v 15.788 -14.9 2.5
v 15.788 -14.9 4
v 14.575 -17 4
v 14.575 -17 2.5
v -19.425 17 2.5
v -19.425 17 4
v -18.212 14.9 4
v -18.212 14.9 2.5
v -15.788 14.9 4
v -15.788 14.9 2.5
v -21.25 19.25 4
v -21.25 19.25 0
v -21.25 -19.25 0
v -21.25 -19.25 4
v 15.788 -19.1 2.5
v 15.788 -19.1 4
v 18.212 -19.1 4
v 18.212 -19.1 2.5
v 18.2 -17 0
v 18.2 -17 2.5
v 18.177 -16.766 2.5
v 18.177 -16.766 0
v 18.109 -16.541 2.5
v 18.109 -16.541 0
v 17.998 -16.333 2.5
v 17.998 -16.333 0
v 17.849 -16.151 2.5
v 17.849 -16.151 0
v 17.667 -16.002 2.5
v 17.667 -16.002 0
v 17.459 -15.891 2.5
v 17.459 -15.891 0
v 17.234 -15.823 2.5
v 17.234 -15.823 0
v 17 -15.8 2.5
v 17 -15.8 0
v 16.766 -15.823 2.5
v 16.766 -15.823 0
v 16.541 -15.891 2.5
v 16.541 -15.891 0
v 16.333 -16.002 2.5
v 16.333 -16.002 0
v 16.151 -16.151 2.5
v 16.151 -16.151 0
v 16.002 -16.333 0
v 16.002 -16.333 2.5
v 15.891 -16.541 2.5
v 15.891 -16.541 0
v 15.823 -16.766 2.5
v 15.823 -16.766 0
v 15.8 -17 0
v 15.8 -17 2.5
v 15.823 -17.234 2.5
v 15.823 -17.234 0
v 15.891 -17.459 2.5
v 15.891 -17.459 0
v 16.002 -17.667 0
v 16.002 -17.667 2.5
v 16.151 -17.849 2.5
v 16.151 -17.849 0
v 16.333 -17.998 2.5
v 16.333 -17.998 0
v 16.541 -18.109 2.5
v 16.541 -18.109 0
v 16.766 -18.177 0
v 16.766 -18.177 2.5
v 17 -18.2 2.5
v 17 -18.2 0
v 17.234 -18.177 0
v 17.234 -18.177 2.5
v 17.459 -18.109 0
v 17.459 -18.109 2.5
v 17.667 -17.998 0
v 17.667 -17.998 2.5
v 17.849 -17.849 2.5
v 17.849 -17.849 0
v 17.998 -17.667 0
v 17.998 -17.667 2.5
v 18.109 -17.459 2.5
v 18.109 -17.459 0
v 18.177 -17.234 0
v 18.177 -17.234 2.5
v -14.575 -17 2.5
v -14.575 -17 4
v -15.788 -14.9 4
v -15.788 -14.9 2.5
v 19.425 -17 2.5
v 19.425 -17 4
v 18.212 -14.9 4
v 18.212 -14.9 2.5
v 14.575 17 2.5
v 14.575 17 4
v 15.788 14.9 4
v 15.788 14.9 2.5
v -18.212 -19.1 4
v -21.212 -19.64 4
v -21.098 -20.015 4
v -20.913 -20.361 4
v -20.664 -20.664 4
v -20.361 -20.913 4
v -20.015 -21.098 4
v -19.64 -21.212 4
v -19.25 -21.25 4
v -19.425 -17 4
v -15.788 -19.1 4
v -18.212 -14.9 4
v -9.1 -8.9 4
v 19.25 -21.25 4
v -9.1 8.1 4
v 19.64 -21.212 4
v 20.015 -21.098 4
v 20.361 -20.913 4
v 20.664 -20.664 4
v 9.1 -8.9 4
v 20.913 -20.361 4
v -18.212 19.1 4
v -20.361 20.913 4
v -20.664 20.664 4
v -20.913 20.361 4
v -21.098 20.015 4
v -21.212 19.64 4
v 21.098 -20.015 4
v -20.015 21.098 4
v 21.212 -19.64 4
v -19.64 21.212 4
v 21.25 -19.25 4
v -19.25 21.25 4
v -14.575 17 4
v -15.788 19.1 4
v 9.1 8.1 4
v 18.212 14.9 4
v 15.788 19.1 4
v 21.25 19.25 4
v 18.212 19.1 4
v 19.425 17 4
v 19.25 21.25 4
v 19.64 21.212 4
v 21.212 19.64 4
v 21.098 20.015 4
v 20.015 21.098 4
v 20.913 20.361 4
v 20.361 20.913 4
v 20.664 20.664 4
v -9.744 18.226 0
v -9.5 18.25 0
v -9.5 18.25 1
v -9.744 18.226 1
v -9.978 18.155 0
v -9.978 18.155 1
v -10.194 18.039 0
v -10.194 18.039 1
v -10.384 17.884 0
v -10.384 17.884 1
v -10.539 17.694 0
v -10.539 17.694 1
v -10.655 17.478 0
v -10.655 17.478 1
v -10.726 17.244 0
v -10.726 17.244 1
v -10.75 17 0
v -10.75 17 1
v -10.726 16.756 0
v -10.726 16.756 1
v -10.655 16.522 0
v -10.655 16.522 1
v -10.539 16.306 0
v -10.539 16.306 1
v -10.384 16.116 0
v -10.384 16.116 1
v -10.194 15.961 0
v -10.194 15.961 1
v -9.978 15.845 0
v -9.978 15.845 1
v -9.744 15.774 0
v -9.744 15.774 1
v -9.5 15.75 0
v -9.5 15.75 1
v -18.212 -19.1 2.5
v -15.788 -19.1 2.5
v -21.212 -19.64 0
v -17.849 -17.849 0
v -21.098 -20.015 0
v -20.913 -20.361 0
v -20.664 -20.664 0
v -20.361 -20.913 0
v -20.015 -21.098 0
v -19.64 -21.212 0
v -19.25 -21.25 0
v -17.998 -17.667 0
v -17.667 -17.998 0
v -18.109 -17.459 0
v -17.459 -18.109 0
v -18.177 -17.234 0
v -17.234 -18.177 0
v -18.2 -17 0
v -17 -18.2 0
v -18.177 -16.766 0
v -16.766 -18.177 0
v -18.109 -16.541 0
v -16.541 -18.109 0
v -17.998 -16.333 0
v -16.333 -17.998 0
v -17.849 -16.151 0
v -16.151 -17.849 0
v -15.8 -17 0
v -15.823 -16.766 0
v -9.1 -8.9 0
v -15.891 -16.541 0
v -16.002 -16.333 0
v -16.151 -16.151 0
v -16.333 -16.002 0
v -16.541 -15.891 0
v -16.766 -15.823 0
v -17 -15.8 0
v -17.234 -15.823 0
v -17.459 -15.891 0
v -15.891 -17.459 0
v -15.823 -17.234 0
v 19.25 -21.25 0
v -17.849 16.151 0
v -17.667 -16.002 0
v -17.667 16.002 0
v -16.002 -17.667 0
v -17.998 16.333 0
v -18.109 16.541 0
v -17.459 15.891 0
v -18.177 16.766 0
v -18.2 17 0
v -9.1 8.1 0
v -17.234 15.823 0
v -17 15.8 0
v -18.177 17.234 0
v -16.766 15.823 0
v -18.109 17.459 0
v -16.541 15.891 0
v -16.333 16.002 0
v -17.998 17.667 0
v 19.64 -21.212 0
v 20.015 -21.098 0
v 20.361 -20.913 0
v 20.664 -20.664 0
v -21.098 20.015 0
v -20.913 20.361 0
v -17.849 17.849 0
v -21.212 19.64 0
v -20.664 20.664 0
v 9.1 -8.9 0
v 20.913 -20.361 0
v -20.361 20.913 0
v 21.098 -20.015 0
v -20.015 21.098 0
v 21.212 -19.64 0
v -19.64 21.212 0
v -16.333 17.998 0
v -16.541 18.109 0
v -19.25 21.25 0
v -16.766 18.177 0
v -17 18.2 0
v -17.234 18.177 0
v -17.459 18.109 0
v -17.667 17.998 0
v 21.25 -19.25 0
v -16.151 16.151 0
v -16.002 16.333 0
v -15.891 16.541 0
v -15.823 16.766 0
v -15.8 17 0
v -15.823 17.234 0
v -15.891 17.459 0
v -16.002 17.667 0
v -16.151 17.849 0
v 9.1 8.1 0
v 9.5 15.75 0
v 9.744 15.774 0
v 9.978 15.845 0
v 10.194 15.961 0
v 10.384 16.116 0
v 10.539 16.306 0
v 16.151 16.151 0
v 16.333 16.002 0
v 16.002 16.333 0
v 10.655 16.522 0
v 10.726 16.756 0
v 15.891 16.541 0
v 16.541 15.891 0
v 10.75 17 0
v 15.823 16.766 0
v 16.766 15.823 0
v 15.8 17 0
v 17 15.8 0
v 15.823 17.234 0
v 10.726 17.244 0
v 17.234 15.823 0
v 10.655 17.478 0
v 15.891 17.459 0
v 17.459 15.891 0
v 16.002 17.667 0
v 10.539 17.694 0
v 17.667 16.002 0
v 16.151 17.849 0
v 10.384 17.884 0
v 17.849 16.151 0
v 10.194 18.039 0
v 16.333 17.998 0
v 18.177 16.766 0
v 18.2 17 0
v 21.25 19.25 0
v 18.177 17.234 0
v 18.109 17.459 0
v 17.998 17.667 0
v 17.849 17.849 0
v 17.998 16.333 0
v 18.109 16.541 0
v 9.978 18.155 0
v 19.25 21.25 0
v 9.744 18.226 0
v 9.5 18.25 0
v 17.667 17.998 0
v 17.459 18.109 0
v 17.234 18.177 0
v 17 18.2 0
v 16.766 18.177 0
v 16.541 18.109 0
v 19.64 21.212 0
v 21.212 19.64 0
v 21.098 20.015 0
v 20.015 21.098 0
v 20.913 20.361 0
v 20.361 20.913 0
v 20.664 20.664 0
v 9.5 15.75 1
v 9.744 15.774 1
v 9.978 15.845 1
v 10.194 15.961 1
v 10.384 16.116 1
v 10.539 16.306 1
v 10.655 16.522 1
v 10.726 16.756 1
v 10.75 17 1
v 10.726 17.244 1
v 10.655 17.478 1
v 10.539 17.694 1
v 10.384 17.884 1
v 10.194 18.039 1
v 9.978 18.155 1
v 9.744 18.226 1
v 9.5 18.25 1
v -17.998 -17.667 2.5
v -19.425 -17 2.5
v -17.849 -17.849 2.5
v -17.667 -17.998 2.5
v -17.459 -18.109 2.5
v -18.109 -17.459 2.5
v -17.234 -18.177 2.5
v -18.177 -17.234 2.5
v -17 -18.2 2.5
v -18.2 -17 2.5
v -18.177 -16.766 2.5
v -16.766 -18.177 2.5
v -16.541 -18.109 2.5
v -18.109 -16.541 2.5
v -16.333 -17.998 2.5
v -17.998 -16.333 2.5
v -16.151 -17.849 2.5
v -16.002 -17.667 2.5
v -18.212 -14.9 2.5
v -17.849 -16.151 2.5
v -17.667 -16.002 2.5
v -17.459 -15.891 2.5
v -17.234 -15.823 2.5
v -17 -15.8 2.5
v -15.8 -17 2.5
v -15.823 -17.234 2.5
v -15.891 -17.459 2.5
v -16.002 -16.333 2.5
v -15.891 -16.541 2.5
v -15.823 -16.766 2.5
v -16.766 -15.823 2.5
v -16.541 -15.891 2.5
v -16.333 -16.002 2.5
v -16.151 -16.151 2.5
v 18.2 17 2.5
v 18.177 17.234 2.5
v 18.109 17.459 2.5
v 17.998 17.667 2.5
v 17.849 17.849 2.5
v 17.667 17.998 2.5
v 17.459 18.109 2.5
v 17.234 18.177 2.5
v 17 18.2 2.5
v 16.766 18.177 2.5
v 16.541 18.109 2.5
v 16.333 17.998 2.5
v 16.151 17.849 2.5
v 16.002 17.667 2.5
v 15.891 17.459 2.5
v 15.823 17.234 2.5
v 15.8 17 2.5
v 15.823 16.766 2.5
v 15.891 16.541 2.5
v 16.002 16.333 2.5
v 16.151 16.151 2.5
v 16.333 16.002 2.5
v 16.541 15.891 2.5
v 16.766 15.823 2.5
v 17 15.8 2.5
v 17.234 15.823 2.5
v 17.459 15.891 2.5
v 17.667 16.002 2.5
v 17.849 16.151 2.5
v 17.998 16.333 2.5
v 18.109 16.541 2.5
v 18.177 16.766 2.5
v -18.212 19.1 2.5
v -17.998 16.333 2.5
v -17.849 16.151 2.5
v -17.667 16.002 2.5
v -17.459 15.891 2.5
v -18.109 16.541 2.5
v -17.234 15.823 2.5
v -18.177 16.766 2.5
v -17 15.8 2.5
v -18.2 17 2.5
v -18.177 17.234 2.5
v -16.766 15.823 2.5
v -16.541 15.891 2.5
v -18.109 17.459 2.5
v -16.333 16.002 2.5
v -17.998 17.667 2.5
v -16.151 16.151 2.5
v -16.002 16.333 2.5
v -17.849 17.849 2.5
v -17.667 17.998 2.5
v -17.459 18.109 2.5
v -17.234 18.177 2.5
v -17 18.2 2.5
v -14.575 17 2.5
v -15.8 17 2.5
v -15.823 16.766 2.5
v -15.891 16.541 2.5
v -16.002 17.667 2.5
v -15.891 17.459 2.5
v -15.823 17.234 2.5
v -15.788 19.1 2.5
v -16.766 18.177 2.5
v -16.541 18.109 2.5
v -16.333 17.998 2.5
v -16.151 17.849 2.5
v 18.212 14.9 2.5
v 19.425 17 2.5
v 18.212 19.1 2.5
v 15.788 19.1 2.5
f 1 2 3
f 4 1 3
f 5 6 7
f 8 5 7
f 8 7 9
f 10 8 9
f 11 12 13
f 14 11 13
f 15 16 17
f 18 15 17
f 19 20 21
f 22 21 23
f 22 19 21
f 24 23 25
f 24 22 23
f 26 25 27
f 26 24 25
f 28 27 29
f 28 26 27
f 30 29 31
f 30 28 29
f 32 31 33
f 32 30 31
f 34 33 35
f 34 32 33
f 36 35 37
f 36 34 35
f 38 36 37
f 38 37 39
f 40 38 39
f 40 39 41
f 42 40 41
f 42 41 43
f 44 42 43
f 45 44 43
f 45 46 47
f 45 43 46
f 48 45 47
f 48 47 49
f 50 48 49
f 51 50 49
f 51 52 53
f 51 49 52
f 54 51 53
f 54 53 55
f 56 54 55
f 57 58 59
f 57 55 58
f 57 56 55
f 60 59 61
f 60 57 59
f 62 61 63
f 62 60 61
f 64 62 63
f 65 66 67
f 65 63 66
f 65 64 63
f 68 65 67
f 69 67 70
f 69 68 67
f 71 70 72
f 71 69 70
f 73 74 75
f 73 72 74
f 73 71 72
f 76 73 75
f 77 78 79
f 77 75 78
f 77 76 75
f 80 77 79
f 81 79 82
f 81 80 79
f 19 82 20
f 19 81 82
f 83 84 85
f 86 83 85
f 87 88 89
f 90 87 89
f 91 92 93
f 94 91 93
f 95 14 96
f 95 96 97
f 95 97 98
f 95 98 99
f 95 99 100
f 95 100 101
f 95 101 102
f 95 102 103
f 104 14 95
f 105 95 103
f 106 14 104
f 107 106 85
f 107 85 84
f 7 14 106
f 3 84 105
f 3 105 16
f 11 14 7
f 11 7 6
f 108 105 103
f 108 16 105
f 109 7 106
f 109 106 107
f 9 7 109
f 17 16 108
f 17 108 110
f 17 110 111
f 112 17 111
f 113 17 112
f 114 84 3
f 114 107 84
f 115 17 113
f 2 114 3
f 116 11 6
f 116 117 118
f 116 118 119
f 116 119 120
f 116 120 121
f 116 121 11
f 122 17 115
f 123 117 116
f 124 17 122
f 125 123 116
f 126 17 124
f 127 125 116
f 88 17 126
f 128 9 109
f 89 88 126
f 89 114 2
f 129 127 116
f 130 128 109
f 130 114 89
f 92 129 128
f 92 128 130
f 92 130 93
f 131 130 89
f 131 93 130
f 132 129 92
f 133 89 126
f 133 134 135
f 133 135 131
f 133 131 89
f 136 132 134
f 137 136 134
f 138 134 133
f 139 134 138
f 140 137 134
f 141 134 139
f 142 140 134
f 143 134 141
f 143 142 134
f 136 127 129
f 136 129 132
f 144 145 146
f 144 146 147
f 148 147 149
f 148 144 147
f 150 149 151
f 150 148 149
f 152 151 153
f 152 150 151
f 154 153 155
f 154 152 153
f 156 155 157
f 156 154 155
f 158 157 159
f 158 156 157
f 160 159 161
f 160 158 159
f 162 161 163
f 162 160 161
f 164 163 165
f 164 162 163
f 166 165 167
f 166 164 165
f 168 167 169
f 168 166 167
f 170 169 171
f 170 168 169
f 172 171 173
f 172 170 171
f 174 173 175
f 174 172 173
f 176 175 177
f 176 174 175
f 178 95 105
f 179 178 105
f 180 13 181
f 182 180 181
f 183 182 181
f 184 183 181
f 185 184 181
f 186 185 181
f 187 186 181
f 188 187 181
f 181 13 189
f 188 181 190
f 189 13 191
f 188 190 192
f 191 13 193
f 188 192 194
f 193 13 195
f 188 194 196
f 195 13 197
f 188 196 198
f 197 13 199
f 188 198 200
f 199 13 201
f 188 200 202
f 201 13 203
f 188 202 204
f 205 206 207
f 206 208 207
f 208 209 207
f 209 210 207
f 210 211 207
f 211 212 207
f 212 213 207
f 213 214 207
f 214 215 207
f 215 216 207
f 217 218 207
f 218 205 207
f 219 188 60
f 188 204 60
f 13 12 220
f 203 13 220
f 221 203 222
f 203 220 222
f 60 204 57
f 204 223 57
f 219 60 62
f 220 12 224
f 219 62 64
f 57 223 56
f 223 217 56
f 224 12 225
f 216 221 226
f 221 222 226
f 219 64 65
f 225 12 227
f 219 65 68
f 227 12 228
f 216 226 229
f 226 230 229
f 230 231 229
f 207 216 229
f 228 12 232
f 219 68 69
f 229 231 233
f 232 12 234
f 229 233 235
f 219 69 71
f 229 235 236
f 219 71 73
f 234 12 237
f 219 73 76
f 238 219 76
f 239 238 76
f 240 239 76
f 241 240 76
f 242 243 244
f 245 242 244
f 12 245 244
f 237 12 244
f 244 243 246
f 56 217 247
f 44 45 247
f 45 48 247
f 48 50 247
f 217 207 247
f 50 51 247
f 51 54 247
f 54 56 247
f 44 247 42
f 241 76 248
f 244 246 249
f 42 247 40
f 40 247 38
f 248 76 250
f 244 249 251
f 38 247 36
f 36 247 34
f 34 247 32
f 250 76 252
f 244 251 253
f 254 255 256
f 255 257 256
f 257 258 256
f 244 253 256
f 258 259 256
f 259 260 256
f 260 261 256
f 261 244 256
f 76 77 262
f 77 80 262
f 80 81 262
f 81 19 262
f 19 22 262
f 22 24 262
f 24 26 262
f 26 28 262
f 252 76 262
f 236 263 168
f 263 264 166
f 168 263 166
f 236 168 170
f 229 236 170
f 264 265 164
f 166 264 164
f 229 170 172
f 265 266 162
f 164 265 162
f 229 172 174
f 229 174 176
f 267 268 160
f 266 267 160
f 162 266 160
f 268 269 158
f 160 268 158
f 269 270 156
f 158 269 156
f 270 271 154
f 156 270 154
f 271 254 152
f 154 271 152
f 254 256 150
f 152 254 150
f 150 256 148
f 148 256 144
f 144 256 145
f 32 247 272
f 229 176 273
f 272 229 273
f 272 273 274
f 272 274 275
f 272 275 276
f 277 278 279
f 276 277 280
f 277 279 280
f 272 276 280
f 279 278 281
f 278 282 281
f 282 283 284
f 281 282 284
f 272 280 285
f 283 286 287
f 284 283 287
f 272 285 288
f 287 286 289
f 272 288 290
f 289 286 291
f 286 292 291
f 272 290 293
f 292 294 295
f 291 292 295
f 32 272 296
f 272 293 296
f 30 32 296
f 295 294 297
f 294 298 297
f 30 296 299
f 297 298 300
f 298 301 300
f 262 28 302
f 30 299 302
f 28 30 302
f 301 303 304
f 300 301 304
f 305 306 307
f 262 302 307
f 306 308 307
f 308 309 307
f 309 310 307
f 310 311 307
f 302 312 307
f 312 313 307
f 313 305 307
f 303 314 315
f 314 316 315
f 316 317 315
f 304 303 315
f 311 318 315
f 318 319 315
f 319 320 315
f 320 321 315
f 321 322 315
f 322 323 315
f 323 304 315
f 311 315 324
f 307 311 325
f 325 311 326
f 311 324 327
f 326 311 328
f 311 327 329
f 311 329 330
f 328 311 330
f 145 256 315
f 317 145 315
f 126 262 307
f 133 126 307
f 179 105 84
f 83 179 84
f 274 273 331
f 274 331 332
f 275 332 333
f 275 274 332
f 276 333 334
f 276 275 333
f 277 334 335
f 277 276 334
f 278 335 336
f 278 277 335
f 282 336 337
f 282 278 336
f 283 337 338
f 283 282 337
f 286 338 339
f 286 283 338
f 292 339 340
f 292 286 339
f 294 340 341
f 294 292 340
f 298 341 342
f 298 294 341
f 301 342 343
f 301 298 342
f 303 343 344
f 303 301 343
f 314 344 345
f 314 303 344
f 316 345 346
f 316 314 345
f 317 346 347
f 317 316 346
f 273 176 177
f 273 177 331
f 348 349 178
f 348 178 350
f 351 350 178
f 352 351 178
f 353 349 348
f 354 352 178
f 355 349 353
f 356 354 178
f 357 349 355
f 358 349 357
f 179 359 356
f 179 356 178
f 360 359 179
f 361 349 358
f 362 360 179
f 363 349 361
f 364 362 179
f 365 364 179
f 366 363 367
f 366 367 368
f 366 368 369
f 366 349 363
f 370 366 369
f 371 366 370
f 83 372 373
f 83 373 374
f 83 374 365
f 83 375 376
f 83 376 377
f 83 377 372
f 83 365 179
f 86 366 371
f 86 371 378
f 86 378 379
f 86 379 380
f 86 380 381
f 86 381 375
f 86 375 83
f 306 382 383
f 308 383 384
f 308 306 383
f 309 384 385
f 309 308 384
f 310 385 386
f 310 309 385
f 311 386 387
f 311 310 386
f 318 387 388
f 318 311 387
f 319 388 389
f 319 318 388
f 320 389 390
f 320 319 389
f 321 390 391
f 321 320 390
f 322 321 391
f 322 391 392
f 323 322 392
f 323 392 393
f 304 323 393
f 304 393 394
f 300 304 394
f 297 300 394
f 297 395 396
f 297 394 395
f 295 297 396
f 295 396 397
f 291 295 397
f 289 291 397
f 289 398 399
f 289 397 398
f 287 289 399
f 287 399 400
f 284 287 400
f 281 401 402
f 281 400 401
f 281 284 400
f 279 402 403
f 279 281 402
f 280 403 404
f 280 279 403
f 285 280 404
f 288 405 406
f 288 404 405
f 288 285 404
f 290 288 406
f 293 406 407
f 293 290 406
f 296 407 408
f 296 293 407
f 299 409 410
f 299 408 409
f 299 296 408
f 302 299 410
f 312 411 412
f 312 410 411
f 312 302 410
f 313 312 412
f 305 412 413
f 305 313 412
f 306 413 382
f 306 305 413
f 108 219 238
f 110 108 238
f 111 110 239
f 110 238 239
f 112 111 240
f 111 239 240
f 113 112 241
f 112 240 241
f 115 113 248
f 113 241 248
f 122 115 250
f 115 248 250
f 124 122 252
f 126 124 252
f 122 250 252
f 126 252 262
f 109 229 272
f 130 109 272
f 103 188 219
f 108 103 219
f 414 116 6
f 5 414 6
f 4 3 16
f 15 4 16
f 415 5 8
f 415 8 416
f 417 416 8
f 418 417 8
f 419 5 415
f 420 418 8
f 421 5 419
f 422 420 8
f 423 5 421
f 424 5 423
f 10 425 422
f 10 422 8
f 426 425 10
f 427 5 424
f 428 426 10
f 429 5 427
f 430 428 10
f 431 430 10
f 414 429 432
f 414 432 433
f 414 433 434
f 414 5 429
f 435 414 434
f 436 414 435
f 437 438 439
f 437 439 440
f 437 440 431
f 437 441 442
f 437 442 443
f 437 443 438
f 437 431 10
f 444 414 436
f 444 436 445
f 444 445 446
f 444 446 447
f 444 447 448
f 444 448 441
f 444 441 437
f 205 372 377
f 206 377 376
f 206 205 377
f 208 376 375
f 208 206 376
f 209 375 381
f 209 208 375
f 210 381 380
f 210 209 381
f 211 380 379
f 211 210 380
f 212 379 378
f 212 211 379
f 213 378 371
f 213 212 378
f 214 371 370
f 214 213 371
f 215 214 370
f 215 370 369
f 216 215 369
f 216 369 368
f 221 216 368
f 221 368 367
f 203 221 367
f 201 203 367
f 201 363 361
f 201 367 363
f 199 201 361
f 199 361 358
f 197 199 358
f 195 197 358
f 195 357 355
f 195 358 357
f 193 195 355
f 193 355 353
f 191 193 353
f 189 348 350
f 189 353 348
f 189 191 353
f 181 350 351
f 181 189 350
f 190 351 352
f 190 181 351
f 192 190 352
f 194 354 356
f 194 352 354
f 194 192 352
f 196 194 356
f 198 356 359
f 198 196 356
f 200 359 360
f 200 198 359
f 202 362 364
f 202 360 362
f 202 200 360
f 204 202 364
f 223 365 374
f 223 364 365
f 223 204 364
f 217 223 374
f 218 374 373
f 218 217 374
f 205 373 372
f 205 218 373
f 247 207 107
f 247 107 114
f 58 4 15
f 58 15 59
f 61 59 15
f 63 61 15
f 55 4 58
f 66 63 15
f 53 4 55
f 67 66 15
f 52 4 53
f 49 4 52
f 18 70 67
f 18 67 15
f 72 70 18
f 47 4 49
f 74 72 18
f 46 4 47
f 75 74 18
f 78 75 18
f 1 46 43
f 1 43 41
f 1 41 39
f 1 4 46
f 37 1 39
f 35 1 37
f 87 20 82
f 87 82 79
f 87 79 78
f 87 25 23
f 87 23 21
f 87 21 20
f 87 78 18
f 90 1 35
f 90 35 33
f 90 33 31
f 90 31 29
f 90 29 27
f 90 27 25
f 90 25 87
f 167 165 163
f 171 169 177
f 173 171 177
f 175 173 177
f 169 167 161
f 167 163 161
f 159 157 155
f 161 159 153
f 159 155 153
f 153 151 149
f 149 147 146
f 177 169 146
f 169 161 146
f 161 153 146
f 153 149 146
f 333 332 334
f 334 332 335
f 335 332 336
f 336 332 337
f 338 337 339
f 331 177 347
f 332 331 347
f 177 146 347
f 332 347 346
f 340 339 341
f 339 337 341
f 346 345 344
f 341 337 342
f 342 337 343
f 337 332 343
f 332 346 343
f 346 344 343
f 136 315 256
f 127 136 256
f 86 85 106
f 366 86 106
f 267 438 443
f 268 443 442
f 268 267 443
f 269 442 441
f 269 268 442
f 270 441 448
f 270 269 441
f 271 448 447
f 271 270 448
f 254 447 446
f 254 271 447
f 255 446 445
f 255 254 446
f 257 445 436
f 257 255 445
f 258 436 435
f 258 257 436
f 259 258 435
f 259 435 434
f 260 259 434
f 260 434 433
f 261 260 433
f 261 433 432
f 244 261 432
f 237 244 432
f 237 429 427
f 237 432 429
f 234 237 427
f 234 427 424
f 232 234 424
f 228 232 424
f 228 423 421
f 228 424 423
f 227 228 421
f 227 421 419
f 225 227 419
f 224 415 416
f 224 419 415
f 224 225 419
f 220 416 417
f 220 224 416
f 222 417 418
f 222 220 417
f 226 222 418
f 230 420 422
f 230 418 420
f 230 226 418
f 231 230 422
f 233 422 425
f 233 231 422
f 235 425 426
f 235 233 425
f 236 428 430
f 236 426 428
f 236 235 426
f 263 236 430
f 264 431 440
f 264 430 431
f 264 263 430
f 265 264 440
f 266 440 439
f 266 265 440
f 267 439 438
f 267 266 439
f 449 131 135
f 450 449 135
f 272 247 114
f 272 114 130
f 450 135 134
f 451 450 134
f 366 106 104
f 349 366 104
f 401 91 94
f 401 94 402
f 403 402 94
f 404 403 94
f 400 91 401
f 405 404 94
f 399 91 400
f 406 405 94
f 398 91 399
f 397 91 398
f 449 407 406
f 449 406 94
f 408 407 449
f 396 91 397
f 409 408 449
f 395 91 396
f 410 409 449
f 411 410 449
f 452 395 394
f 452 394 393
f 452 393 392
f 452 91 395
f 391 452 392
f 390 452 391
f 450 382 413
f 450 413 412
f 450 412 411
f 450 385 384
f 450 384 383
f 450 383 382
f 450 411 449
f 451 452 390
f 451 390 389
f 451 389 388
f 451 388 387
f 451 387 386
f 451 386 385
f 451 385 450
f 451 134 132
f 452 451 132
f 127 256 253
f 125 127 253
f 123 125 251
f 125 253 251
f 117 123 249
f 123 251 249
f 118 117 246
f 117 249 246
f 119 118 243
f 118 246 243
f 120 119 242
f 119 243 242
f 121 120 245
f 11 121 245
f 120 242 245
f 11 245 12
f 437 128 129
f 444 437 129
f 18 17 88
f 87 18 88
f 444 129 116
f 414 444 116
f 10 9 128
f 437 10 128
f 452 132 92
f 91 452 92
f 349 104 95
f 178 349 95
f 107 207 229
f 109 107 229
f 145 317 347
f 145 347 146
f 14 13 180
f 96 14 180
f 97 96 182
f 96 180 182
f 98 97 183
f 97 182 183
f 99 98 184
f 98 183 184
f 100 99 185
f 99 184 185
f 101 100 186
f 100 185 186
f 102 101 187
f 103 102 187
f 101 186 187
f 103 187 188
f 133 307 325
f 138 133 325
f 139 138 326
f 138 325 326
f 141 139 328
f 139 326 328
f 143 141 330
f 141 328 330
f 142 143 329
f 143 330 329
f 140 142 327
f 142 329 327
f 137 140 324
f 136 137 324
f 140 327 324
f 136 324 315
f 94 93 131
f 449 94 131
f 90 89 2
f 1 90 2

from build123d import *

# Parameters (mm, degrees)
SKETCH1_R           = 1.2
SKETCH1_W           = 18.2
SKETCH1_H           = 17
BOSS_EXTRUDE1_DEPTH = 4
CUT_EXTRUDE3_DEPTH  = 1
CUT_EXTRUDE4_DEPTH  = 1.5


with BuildPart() as part:
    # Sketch1 → Boss-Extrude1 (new body)
    with BuildSketch(Plane.XY):
        with BuildLine():
            Line((21.25, -19.25), (21.25, 19.25))
            ThreePointArc((21.25, 19.25), (20.664213562, 20.664213562), (19.25, 21.25))
            Line((19.25, 21.25), (-19.25, 21.25))
            ThreePointArc((-19.25, 21.25), (-20.664213562, 20.664213562), (-21.25, 19.25))
            Line((-21.25, 19.25), (-21.25, -19.25))
            ThreePointArc((-21.25, -19.25), (-20.664213562, -20.664213562), (-19.25, -21.25))
            Line((-19.25, -21.25), (19.25, -21.25))
            ThreePointArc((19.25, -21.25), (20.664213562, -20.664213562), (21.25, -19.25))
        make_face()
        with Locations((-17, -17)):
            Circle(SKETCH1_R, mode=Mode.SUBTRACT)
        with Locations((17, -17)):
            Circle(SKETCH1_R, mode=Mode.SUBTRACT)
        with Locations((17, 17)):
            Circle(SKETCH1_R, mode=Mode.SUBTRACT)
        with Locations((-17, 17)):
            Circle(SKETCH1_R, mode=Mode.SUBTRACT)
        with Locations((0, -0.4)):
            Rectangle(SKETCH1_W, SKETCH1_H, mode=Mode.SUBTRACT)
    extrude(amount=BOSS_EXTRUDE1_DEPTH)

    # Sketch2 → Cut-Extrude3 (cut)
    with BuildSketch(Plane(origin=(0, 0, 0), x_dir=(-1, 0, 0), z_dir=(0, 0, -1))):
        with BuildLine():
            Line((-9.5, 18.25), (9.5, 18.25))
            ThreePointArc((9.5, 18.25), (10.75, 17), (9.5, 15.75))
            Line((9.5, 15.75), (-9.5, 15.75))
            ThreePointArc((-9.5, 15.75), (-10.75, 17), (-9.5, 18.25))
        make_face()
    extrude(amount=-CUT_EXTRUDE3_DEPTH, mode=Mode.SUBTRACT)

    # Sketch3 → Cut-Extrude4 (cut)
    with BuildSketch(Plane.XY.offset(4)):
        Polygon((-18.212435565, -14.9), (-19.424871131, -17), (-18.212435565, -19.1), (-15.787564435, -19.1), (-14.575128869, -17), (-15.787564435, -14.9), align=None)
        Polygon((15.787564435, -14.9), (14.575128869, -17), (15.787564435, -19.1), (18.212435565, -19.1), (19.424871131, -17), (18.212435565, -14.9), align=None)
        Polygon((-18.212435565, 19.1), (-19.424871131, 17), (-18.212435565, 14.9), (-15.787564435, 14.9), (-14.575128869, 17), (-15.787564435, 19.1), align=None)
        Polygon((15.787564435, 19.1), (14.575128869, 17), (15.787564435, 14.9), (18.212435565, 14.9), (19.424871131, 17), (18.212435565, 19.1), align=None)
    extrude(amount=-CUT_EXTRUDE4_DEPTH, mode=Mode.SUBTRACT)


solid = part.part
